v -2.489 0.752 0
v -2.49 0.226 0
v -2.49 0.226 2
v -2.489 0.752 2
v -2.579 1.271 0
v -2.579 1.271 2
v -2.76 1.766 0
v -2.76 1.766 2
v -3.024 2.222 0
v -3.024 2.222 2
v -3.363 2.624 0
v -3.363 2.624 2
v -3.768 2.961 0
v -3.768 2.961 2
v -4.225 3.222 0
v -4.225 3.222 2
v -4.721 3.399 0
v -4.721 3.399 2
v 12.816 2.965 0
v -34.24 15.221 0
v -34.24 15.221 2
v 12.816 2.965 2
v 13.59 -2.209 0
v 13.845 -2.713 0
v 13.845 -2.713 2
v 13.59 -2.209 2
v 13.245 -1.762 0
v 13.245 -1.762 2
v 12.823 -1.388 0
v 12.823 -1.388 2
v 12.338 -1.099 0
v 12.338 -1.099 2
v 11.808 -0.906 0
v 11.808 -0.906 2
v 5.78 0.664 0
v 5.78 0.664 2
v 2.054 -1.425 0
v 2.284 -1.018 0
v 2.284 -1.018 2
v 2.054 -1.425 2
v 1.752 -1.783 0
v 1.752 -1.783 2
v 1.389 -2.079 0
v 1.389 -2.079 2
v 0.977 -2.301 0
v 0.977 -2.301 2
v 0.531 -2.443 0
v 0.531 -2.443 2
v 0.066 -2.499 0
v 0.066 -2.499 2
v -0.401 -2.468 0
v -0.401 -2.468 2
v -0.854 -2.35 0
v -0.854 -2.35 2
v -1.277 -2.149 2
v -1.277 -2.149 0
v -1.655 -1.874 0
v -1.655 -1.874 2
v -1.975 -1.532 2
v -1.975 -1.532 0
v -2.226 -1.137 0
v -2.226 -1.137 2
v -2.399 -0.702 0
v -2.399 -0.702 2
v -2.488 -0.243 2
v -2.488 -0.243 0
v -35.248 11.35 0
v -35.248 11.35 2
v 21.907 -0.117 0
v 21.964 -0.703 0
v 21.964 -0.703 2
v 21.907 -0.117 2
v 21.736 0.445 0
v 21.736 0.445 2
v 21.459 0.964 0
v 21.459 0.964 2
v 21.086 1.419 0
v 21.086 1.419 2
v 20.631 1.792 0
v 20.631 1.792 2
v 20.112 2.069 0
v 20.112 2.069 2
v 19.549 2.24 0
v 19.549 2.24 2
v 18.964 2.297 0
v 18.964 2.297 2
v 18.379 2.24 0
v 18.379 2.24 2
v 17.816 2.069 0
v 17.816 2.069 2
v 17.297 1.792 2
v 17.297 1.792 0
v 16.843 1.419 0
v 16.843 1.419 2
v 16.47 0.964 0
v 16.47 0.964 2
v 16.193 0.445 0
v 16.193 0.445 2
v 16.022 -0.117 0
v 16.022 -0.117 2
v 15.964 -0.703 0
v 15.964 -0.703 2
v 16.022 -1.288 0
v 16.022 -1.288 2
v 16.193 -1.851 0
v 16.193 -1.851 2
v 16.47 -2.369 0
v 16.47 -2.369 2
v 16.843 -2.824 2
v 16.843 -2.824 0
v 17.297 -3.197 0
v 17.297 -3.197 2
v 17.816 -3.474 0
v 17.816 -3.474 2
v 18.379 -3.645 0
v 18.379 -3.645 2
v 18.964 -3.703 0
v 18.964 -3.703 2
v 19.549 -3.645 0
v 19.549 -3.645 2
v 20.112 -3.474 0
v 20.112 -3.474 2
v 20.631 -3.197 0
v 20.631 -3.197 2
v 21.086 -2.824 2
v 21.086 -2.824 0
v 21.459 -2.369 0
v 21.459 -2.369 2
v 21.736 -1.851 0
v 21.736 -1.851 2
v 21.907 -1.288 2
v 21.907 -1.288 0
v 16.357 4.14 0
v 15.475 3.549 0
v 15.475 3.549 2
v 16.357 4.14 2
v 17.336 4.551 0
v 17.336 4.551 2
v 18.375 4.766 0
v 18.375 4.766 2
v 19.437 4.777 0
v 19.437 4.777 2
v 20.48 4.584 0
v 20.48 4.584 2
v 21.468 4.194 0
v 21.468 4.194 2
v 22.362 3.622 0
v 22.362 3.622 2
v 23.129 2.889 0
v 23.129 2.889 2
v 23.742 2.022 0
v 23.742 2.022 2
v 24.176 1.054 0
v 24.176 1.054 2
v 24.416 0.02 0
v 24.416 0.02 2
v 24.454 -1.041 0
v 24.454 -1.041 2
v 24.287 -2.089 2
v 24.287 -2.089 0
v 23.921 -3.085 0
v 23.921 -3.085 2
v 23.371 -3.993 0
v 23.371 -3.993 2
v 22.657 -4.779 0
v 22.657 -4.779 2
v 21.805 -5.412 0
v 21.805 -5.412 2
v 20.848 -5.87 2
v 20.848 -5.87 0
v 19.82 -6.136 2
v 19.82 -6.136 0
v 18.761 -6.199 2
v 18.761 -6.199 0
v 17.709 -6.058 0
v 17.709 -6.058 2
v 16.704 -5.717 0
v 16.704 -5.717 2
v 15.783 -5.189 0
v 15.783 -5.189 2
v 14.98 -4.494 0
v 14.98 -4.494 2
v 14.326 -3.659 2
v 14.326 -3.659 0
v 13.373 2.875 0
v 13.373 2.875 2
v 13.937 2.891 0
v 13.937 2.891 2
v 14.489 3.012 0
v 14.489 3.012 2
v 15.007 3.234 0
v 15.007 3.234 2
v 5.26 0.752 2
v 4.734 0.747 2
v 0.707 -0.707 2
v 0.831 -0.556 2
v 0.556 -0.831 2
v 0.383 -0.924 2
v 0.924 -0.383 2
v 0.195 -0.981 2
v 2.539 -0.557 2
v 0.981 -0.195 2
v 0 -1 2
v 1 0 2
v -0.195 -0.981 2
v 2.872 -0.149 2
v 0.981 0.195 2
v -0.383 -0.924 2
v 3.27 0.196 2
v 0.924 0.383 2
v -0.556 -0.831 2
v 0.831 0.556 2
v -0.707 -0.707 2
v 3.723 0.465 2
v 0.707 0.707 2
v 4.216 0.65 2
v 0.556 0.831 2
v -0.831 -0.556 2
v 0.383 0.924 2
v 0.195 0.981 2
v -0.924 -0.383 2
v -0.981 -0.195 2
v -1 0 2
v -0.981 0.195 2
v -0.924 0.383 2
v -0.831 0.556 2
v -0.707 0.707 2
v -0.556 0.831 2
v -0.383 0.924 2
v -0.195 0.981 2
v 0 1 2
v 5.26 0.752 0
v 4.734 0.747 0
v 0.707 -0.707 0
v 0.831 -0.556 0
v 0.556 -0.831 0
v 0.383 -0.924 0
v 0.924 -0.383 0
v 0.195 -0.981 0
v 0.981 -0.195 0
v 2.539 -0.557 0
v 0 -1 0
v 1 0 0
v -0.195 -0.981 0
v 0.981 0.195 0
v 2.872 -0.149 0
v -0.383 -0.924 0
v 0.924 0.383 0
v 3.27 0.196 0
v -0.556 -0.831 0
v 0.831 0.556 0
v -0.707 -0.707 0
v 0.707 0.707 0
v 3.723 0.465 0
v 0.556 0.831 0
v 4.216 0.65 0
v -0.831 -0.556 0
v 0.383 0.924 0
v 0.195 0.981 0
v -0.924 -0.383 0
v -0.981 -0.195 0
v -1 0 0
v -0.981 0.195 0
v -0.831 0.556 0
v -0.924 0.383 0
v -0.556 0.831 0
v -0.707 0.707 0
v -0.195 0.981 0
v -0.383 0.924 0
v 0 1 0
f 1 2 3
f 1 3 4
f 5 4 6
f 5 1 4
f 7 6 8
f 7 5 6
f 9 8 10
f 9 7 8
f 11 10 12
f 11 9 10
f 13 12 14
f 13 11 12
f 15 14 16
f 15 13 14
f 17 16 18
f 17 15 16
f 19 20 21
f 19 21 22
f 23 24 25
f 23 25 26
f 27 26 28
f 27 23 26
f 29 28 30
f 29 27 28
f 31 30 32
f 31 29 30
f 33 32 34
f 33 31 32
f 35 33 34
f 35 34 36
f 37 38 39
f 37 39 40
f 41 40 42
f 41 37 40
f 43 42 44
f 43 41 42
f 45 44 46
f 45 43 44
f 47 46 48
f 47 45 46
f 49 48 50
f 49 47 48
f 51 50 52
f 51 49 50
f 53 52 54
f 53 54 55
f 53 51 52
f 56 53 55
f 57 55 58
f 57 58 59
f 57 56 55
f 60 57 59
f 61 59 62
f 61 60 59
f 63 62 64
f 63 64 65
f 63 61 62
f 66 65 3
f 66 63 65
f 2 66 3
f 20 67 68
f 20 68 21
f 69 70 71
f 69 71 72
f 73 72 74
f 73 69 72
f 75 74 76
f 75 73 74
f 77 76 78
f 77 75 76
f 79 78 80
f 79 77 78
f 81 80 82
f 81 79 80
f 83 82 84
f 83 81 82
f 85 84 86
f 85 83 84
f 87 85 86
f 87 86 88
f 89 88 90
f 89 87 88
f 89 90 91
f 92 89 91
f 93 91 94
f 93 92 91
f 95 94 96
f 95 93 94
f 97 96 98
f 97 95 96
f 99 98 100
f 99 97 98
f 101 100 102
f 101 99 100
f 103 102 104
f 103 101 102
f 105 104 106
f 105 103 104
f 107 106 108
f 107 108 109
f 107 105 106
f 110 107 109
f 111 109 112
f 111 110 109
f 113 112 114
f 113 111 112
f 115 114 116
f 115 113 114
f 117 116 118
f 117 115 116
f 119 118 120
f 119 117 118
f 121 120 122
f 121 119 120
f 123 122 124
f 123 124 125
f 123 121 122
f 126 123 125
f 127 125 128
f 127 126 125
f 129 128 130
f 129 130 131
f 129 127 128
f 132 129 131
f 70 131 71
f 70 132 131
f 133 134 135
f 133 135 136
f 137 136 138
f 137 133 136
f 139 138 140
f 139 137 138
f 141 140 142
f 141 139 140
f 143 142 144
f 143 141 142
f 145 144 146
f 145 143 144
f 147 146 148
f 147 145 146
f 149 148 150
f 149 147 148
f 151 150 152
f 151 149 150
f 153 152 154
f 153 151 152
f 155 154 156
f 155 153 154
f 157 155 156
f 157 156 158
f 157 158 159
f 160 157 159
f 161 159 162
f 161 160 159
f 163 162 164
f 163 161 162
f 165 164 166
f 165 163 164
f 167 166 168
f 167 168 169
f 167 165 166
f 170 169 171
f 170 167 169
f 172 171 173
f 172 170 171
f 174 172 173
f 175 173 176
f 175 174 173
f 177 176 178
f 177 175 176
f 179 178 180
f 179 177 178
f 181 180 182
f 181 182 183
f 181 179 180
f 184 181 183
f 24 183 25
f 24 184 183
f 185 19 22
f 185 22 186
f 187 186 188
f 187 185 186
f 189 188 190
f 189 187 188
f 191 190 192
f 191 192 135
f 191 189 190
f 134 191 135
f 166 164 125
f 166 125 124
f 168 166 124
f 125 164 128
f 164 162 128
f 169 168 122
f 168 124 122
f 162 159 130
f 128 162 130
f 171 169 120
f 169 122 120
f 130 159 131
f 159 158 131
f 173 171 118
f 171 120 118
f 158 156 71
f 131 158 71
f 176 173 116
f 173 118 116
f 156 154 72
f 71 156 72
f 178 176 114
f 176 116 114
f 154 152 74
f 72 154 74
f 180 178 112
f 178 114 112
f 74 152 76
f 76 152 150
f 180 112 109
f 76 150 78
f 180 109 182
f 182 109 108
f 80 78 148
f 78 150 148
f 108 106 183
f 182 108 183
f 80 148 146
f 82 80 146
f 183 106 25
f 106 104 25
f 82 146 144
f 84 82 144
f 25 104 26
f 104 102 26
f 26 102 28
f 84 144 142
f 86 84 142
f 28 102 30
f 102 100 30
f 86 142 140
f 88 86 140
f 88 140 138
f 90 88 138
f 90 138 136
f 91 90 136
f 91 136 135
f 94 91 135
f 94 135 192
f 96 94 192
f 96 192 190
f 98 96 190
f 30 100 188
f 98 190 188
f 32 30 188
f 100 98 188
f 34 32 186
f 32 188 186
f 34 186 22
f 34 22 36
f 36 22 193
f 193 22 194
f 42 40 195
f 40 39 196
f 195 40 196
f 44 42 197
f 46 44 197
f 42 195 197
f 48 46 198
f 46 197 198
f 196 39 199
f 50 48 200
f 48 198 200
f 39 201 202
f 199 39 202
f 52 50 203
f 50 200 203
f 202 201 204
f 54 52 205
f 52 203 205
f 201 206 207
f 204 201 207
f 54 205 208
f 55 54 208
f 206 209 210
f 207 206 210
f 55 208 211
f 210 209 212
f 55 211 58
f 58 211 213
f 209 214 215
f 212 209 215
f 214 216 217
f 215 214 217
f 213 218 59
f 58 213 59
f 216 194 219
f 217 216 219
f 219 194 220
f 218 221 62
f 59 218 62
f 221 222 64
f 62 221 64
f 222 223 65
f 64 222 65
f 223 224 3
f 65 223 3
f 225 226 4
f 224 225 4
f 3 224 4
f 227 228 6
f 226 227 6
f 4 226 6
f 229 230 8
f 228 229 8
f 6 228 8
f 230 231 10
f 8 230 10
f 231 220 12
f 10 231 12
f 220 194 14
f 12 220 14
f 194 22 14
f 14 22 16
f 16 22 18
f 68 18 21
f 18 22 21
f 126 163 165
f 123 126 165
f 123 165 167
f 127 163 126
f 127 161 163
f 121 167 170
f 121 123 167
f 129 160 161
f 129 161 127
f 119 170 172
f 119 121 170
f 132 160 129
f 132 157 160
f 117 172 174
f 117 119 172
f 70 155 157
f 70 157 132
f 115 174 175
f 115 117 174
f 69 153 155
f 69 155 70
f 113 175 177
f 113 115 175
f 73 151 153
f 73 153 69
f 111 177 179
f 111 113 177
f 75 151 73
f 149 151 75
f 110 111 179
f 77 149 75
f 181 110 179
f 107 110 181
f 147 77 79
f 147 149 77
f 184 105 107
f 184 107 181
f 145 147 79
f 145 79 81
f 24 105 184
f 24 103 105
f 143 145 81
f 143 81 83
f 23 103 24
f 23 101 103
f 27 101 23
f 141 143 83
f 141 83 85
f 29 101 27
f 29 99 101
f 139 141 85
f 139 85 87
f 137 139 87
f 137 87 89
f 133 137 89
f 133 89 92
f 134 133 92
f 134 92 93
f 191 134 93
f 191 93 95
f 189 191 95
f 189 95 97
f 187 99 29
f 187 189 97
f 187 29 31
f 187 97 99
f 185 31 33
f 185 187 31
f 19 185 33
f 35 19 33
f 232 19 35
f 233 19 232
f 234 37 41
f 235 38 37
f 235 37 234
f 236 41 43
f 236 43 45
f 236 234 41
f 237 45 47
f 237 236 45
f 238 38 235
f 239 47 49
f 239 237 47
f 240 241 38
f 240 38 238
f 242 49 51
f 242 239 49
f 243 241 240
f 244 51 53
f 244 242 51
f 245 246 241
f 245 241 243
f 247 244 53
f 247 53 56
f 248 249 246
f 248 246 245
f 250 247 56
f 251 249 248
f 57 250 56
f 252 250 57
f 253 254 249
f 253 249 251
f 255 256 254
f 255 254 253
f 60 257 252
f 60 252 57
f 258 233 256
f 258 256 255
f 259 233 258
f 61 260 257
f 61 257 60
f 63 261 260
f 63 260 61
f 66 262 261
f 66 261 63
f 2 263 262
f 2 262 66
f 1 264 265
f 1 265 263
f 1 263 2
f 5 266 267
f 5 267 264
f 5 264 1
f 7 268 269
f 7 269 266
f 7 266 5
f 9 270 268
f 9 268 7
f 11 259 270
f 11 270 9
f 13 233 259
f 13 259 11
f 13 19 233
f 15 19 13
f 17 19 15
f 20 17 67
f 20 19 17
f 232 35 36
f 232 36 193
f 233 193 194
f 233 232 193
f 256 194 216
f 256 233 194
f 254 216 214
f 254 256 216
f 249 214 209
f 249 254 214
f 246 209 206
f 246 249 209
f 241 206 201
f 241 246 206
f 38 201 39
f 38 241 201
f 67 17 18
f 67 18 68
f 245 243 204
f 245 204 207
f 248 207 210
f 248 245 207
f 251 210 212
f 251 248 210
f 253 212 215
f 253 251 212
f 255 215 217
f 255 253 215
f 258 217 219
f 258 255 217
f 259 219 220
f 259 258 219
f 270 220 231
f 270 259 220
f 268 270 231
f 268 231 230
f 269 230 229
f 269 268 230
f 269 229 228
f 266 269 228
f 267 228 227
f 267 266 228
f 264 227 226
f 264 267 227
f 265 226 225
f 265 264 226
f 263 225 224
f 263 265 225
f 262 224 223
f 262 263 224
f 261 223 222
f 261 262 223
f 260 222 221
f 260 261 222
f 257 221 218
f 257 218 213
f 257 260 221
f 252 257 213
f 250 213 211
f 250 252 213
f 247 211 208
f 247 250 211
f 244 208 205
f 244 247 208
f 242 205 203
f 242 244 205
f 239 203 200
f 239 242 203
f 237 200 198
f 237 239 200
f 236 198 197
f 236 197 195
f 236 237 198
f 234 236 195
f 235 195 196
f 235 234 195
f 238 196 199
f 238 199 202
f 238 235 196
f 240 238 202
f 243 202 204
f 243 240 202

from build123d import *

# Parameters (mm, degrees)
SKETCH1_R           = 1
SKETCH1_R_2         = 3
BOSS_EXTRUDE1_DEPTH = 2


with BuildPart() as part:
    # Sketch1 → Boss-Extrude1 (new body)
    with BuildSketch(Plane.XY):
        with BuildLine():
            Line((11.808151179, -0.905709908), (5.779825316, 0.664336707))
            ThreePointArc((5.779825316, 0.664336707), (3.723166432, 0.464621774), (2.283506385, -1.017643645))
            ThreePointArc((2.283506385, -1.017643645), (-0.630092723, -2.419293938), (-2.489805466, 0.225540995))
            ThreePointArc((-2.489805466, 0.225540995), (-3.023512134, 2.221759674), (-4.721460758, 3.399342916))
            Line((-4.721460758, 3.399342916), (-35.248215692, 11.34987999))
            Line((-35.248215692, 11.34987999), (-34.240067334, 15.220750291))
            Line((-34.240067334, 15.220750291), (12.816299536, 2.965160393))
            ThreePointArc((12.816299536, 2.965160393), (14.215899346, 2.938138637), (15.47538955, 3.54911673))
            ThreePointArc((15.47538955, 3.54911673), (24.286630582, -2.088947309), (13.844561325, -2.712585228))
            ThreePointArc((13.844561325, -2.712585228), (13.043119538, -1.564847947), (11.808151179, -0.905709908))
        make_face()
        Circle(SKETCH1_R, mode=Mode.SUBTRACT)
        with Locations((18.964183918, -0.702743317)):
            Circle(SKETCH1_R_2, mode=Mode.SUBTRACT)
    extrude(amount=BOSS_EXTRUDE1_DEPTH)


solid = part.part
